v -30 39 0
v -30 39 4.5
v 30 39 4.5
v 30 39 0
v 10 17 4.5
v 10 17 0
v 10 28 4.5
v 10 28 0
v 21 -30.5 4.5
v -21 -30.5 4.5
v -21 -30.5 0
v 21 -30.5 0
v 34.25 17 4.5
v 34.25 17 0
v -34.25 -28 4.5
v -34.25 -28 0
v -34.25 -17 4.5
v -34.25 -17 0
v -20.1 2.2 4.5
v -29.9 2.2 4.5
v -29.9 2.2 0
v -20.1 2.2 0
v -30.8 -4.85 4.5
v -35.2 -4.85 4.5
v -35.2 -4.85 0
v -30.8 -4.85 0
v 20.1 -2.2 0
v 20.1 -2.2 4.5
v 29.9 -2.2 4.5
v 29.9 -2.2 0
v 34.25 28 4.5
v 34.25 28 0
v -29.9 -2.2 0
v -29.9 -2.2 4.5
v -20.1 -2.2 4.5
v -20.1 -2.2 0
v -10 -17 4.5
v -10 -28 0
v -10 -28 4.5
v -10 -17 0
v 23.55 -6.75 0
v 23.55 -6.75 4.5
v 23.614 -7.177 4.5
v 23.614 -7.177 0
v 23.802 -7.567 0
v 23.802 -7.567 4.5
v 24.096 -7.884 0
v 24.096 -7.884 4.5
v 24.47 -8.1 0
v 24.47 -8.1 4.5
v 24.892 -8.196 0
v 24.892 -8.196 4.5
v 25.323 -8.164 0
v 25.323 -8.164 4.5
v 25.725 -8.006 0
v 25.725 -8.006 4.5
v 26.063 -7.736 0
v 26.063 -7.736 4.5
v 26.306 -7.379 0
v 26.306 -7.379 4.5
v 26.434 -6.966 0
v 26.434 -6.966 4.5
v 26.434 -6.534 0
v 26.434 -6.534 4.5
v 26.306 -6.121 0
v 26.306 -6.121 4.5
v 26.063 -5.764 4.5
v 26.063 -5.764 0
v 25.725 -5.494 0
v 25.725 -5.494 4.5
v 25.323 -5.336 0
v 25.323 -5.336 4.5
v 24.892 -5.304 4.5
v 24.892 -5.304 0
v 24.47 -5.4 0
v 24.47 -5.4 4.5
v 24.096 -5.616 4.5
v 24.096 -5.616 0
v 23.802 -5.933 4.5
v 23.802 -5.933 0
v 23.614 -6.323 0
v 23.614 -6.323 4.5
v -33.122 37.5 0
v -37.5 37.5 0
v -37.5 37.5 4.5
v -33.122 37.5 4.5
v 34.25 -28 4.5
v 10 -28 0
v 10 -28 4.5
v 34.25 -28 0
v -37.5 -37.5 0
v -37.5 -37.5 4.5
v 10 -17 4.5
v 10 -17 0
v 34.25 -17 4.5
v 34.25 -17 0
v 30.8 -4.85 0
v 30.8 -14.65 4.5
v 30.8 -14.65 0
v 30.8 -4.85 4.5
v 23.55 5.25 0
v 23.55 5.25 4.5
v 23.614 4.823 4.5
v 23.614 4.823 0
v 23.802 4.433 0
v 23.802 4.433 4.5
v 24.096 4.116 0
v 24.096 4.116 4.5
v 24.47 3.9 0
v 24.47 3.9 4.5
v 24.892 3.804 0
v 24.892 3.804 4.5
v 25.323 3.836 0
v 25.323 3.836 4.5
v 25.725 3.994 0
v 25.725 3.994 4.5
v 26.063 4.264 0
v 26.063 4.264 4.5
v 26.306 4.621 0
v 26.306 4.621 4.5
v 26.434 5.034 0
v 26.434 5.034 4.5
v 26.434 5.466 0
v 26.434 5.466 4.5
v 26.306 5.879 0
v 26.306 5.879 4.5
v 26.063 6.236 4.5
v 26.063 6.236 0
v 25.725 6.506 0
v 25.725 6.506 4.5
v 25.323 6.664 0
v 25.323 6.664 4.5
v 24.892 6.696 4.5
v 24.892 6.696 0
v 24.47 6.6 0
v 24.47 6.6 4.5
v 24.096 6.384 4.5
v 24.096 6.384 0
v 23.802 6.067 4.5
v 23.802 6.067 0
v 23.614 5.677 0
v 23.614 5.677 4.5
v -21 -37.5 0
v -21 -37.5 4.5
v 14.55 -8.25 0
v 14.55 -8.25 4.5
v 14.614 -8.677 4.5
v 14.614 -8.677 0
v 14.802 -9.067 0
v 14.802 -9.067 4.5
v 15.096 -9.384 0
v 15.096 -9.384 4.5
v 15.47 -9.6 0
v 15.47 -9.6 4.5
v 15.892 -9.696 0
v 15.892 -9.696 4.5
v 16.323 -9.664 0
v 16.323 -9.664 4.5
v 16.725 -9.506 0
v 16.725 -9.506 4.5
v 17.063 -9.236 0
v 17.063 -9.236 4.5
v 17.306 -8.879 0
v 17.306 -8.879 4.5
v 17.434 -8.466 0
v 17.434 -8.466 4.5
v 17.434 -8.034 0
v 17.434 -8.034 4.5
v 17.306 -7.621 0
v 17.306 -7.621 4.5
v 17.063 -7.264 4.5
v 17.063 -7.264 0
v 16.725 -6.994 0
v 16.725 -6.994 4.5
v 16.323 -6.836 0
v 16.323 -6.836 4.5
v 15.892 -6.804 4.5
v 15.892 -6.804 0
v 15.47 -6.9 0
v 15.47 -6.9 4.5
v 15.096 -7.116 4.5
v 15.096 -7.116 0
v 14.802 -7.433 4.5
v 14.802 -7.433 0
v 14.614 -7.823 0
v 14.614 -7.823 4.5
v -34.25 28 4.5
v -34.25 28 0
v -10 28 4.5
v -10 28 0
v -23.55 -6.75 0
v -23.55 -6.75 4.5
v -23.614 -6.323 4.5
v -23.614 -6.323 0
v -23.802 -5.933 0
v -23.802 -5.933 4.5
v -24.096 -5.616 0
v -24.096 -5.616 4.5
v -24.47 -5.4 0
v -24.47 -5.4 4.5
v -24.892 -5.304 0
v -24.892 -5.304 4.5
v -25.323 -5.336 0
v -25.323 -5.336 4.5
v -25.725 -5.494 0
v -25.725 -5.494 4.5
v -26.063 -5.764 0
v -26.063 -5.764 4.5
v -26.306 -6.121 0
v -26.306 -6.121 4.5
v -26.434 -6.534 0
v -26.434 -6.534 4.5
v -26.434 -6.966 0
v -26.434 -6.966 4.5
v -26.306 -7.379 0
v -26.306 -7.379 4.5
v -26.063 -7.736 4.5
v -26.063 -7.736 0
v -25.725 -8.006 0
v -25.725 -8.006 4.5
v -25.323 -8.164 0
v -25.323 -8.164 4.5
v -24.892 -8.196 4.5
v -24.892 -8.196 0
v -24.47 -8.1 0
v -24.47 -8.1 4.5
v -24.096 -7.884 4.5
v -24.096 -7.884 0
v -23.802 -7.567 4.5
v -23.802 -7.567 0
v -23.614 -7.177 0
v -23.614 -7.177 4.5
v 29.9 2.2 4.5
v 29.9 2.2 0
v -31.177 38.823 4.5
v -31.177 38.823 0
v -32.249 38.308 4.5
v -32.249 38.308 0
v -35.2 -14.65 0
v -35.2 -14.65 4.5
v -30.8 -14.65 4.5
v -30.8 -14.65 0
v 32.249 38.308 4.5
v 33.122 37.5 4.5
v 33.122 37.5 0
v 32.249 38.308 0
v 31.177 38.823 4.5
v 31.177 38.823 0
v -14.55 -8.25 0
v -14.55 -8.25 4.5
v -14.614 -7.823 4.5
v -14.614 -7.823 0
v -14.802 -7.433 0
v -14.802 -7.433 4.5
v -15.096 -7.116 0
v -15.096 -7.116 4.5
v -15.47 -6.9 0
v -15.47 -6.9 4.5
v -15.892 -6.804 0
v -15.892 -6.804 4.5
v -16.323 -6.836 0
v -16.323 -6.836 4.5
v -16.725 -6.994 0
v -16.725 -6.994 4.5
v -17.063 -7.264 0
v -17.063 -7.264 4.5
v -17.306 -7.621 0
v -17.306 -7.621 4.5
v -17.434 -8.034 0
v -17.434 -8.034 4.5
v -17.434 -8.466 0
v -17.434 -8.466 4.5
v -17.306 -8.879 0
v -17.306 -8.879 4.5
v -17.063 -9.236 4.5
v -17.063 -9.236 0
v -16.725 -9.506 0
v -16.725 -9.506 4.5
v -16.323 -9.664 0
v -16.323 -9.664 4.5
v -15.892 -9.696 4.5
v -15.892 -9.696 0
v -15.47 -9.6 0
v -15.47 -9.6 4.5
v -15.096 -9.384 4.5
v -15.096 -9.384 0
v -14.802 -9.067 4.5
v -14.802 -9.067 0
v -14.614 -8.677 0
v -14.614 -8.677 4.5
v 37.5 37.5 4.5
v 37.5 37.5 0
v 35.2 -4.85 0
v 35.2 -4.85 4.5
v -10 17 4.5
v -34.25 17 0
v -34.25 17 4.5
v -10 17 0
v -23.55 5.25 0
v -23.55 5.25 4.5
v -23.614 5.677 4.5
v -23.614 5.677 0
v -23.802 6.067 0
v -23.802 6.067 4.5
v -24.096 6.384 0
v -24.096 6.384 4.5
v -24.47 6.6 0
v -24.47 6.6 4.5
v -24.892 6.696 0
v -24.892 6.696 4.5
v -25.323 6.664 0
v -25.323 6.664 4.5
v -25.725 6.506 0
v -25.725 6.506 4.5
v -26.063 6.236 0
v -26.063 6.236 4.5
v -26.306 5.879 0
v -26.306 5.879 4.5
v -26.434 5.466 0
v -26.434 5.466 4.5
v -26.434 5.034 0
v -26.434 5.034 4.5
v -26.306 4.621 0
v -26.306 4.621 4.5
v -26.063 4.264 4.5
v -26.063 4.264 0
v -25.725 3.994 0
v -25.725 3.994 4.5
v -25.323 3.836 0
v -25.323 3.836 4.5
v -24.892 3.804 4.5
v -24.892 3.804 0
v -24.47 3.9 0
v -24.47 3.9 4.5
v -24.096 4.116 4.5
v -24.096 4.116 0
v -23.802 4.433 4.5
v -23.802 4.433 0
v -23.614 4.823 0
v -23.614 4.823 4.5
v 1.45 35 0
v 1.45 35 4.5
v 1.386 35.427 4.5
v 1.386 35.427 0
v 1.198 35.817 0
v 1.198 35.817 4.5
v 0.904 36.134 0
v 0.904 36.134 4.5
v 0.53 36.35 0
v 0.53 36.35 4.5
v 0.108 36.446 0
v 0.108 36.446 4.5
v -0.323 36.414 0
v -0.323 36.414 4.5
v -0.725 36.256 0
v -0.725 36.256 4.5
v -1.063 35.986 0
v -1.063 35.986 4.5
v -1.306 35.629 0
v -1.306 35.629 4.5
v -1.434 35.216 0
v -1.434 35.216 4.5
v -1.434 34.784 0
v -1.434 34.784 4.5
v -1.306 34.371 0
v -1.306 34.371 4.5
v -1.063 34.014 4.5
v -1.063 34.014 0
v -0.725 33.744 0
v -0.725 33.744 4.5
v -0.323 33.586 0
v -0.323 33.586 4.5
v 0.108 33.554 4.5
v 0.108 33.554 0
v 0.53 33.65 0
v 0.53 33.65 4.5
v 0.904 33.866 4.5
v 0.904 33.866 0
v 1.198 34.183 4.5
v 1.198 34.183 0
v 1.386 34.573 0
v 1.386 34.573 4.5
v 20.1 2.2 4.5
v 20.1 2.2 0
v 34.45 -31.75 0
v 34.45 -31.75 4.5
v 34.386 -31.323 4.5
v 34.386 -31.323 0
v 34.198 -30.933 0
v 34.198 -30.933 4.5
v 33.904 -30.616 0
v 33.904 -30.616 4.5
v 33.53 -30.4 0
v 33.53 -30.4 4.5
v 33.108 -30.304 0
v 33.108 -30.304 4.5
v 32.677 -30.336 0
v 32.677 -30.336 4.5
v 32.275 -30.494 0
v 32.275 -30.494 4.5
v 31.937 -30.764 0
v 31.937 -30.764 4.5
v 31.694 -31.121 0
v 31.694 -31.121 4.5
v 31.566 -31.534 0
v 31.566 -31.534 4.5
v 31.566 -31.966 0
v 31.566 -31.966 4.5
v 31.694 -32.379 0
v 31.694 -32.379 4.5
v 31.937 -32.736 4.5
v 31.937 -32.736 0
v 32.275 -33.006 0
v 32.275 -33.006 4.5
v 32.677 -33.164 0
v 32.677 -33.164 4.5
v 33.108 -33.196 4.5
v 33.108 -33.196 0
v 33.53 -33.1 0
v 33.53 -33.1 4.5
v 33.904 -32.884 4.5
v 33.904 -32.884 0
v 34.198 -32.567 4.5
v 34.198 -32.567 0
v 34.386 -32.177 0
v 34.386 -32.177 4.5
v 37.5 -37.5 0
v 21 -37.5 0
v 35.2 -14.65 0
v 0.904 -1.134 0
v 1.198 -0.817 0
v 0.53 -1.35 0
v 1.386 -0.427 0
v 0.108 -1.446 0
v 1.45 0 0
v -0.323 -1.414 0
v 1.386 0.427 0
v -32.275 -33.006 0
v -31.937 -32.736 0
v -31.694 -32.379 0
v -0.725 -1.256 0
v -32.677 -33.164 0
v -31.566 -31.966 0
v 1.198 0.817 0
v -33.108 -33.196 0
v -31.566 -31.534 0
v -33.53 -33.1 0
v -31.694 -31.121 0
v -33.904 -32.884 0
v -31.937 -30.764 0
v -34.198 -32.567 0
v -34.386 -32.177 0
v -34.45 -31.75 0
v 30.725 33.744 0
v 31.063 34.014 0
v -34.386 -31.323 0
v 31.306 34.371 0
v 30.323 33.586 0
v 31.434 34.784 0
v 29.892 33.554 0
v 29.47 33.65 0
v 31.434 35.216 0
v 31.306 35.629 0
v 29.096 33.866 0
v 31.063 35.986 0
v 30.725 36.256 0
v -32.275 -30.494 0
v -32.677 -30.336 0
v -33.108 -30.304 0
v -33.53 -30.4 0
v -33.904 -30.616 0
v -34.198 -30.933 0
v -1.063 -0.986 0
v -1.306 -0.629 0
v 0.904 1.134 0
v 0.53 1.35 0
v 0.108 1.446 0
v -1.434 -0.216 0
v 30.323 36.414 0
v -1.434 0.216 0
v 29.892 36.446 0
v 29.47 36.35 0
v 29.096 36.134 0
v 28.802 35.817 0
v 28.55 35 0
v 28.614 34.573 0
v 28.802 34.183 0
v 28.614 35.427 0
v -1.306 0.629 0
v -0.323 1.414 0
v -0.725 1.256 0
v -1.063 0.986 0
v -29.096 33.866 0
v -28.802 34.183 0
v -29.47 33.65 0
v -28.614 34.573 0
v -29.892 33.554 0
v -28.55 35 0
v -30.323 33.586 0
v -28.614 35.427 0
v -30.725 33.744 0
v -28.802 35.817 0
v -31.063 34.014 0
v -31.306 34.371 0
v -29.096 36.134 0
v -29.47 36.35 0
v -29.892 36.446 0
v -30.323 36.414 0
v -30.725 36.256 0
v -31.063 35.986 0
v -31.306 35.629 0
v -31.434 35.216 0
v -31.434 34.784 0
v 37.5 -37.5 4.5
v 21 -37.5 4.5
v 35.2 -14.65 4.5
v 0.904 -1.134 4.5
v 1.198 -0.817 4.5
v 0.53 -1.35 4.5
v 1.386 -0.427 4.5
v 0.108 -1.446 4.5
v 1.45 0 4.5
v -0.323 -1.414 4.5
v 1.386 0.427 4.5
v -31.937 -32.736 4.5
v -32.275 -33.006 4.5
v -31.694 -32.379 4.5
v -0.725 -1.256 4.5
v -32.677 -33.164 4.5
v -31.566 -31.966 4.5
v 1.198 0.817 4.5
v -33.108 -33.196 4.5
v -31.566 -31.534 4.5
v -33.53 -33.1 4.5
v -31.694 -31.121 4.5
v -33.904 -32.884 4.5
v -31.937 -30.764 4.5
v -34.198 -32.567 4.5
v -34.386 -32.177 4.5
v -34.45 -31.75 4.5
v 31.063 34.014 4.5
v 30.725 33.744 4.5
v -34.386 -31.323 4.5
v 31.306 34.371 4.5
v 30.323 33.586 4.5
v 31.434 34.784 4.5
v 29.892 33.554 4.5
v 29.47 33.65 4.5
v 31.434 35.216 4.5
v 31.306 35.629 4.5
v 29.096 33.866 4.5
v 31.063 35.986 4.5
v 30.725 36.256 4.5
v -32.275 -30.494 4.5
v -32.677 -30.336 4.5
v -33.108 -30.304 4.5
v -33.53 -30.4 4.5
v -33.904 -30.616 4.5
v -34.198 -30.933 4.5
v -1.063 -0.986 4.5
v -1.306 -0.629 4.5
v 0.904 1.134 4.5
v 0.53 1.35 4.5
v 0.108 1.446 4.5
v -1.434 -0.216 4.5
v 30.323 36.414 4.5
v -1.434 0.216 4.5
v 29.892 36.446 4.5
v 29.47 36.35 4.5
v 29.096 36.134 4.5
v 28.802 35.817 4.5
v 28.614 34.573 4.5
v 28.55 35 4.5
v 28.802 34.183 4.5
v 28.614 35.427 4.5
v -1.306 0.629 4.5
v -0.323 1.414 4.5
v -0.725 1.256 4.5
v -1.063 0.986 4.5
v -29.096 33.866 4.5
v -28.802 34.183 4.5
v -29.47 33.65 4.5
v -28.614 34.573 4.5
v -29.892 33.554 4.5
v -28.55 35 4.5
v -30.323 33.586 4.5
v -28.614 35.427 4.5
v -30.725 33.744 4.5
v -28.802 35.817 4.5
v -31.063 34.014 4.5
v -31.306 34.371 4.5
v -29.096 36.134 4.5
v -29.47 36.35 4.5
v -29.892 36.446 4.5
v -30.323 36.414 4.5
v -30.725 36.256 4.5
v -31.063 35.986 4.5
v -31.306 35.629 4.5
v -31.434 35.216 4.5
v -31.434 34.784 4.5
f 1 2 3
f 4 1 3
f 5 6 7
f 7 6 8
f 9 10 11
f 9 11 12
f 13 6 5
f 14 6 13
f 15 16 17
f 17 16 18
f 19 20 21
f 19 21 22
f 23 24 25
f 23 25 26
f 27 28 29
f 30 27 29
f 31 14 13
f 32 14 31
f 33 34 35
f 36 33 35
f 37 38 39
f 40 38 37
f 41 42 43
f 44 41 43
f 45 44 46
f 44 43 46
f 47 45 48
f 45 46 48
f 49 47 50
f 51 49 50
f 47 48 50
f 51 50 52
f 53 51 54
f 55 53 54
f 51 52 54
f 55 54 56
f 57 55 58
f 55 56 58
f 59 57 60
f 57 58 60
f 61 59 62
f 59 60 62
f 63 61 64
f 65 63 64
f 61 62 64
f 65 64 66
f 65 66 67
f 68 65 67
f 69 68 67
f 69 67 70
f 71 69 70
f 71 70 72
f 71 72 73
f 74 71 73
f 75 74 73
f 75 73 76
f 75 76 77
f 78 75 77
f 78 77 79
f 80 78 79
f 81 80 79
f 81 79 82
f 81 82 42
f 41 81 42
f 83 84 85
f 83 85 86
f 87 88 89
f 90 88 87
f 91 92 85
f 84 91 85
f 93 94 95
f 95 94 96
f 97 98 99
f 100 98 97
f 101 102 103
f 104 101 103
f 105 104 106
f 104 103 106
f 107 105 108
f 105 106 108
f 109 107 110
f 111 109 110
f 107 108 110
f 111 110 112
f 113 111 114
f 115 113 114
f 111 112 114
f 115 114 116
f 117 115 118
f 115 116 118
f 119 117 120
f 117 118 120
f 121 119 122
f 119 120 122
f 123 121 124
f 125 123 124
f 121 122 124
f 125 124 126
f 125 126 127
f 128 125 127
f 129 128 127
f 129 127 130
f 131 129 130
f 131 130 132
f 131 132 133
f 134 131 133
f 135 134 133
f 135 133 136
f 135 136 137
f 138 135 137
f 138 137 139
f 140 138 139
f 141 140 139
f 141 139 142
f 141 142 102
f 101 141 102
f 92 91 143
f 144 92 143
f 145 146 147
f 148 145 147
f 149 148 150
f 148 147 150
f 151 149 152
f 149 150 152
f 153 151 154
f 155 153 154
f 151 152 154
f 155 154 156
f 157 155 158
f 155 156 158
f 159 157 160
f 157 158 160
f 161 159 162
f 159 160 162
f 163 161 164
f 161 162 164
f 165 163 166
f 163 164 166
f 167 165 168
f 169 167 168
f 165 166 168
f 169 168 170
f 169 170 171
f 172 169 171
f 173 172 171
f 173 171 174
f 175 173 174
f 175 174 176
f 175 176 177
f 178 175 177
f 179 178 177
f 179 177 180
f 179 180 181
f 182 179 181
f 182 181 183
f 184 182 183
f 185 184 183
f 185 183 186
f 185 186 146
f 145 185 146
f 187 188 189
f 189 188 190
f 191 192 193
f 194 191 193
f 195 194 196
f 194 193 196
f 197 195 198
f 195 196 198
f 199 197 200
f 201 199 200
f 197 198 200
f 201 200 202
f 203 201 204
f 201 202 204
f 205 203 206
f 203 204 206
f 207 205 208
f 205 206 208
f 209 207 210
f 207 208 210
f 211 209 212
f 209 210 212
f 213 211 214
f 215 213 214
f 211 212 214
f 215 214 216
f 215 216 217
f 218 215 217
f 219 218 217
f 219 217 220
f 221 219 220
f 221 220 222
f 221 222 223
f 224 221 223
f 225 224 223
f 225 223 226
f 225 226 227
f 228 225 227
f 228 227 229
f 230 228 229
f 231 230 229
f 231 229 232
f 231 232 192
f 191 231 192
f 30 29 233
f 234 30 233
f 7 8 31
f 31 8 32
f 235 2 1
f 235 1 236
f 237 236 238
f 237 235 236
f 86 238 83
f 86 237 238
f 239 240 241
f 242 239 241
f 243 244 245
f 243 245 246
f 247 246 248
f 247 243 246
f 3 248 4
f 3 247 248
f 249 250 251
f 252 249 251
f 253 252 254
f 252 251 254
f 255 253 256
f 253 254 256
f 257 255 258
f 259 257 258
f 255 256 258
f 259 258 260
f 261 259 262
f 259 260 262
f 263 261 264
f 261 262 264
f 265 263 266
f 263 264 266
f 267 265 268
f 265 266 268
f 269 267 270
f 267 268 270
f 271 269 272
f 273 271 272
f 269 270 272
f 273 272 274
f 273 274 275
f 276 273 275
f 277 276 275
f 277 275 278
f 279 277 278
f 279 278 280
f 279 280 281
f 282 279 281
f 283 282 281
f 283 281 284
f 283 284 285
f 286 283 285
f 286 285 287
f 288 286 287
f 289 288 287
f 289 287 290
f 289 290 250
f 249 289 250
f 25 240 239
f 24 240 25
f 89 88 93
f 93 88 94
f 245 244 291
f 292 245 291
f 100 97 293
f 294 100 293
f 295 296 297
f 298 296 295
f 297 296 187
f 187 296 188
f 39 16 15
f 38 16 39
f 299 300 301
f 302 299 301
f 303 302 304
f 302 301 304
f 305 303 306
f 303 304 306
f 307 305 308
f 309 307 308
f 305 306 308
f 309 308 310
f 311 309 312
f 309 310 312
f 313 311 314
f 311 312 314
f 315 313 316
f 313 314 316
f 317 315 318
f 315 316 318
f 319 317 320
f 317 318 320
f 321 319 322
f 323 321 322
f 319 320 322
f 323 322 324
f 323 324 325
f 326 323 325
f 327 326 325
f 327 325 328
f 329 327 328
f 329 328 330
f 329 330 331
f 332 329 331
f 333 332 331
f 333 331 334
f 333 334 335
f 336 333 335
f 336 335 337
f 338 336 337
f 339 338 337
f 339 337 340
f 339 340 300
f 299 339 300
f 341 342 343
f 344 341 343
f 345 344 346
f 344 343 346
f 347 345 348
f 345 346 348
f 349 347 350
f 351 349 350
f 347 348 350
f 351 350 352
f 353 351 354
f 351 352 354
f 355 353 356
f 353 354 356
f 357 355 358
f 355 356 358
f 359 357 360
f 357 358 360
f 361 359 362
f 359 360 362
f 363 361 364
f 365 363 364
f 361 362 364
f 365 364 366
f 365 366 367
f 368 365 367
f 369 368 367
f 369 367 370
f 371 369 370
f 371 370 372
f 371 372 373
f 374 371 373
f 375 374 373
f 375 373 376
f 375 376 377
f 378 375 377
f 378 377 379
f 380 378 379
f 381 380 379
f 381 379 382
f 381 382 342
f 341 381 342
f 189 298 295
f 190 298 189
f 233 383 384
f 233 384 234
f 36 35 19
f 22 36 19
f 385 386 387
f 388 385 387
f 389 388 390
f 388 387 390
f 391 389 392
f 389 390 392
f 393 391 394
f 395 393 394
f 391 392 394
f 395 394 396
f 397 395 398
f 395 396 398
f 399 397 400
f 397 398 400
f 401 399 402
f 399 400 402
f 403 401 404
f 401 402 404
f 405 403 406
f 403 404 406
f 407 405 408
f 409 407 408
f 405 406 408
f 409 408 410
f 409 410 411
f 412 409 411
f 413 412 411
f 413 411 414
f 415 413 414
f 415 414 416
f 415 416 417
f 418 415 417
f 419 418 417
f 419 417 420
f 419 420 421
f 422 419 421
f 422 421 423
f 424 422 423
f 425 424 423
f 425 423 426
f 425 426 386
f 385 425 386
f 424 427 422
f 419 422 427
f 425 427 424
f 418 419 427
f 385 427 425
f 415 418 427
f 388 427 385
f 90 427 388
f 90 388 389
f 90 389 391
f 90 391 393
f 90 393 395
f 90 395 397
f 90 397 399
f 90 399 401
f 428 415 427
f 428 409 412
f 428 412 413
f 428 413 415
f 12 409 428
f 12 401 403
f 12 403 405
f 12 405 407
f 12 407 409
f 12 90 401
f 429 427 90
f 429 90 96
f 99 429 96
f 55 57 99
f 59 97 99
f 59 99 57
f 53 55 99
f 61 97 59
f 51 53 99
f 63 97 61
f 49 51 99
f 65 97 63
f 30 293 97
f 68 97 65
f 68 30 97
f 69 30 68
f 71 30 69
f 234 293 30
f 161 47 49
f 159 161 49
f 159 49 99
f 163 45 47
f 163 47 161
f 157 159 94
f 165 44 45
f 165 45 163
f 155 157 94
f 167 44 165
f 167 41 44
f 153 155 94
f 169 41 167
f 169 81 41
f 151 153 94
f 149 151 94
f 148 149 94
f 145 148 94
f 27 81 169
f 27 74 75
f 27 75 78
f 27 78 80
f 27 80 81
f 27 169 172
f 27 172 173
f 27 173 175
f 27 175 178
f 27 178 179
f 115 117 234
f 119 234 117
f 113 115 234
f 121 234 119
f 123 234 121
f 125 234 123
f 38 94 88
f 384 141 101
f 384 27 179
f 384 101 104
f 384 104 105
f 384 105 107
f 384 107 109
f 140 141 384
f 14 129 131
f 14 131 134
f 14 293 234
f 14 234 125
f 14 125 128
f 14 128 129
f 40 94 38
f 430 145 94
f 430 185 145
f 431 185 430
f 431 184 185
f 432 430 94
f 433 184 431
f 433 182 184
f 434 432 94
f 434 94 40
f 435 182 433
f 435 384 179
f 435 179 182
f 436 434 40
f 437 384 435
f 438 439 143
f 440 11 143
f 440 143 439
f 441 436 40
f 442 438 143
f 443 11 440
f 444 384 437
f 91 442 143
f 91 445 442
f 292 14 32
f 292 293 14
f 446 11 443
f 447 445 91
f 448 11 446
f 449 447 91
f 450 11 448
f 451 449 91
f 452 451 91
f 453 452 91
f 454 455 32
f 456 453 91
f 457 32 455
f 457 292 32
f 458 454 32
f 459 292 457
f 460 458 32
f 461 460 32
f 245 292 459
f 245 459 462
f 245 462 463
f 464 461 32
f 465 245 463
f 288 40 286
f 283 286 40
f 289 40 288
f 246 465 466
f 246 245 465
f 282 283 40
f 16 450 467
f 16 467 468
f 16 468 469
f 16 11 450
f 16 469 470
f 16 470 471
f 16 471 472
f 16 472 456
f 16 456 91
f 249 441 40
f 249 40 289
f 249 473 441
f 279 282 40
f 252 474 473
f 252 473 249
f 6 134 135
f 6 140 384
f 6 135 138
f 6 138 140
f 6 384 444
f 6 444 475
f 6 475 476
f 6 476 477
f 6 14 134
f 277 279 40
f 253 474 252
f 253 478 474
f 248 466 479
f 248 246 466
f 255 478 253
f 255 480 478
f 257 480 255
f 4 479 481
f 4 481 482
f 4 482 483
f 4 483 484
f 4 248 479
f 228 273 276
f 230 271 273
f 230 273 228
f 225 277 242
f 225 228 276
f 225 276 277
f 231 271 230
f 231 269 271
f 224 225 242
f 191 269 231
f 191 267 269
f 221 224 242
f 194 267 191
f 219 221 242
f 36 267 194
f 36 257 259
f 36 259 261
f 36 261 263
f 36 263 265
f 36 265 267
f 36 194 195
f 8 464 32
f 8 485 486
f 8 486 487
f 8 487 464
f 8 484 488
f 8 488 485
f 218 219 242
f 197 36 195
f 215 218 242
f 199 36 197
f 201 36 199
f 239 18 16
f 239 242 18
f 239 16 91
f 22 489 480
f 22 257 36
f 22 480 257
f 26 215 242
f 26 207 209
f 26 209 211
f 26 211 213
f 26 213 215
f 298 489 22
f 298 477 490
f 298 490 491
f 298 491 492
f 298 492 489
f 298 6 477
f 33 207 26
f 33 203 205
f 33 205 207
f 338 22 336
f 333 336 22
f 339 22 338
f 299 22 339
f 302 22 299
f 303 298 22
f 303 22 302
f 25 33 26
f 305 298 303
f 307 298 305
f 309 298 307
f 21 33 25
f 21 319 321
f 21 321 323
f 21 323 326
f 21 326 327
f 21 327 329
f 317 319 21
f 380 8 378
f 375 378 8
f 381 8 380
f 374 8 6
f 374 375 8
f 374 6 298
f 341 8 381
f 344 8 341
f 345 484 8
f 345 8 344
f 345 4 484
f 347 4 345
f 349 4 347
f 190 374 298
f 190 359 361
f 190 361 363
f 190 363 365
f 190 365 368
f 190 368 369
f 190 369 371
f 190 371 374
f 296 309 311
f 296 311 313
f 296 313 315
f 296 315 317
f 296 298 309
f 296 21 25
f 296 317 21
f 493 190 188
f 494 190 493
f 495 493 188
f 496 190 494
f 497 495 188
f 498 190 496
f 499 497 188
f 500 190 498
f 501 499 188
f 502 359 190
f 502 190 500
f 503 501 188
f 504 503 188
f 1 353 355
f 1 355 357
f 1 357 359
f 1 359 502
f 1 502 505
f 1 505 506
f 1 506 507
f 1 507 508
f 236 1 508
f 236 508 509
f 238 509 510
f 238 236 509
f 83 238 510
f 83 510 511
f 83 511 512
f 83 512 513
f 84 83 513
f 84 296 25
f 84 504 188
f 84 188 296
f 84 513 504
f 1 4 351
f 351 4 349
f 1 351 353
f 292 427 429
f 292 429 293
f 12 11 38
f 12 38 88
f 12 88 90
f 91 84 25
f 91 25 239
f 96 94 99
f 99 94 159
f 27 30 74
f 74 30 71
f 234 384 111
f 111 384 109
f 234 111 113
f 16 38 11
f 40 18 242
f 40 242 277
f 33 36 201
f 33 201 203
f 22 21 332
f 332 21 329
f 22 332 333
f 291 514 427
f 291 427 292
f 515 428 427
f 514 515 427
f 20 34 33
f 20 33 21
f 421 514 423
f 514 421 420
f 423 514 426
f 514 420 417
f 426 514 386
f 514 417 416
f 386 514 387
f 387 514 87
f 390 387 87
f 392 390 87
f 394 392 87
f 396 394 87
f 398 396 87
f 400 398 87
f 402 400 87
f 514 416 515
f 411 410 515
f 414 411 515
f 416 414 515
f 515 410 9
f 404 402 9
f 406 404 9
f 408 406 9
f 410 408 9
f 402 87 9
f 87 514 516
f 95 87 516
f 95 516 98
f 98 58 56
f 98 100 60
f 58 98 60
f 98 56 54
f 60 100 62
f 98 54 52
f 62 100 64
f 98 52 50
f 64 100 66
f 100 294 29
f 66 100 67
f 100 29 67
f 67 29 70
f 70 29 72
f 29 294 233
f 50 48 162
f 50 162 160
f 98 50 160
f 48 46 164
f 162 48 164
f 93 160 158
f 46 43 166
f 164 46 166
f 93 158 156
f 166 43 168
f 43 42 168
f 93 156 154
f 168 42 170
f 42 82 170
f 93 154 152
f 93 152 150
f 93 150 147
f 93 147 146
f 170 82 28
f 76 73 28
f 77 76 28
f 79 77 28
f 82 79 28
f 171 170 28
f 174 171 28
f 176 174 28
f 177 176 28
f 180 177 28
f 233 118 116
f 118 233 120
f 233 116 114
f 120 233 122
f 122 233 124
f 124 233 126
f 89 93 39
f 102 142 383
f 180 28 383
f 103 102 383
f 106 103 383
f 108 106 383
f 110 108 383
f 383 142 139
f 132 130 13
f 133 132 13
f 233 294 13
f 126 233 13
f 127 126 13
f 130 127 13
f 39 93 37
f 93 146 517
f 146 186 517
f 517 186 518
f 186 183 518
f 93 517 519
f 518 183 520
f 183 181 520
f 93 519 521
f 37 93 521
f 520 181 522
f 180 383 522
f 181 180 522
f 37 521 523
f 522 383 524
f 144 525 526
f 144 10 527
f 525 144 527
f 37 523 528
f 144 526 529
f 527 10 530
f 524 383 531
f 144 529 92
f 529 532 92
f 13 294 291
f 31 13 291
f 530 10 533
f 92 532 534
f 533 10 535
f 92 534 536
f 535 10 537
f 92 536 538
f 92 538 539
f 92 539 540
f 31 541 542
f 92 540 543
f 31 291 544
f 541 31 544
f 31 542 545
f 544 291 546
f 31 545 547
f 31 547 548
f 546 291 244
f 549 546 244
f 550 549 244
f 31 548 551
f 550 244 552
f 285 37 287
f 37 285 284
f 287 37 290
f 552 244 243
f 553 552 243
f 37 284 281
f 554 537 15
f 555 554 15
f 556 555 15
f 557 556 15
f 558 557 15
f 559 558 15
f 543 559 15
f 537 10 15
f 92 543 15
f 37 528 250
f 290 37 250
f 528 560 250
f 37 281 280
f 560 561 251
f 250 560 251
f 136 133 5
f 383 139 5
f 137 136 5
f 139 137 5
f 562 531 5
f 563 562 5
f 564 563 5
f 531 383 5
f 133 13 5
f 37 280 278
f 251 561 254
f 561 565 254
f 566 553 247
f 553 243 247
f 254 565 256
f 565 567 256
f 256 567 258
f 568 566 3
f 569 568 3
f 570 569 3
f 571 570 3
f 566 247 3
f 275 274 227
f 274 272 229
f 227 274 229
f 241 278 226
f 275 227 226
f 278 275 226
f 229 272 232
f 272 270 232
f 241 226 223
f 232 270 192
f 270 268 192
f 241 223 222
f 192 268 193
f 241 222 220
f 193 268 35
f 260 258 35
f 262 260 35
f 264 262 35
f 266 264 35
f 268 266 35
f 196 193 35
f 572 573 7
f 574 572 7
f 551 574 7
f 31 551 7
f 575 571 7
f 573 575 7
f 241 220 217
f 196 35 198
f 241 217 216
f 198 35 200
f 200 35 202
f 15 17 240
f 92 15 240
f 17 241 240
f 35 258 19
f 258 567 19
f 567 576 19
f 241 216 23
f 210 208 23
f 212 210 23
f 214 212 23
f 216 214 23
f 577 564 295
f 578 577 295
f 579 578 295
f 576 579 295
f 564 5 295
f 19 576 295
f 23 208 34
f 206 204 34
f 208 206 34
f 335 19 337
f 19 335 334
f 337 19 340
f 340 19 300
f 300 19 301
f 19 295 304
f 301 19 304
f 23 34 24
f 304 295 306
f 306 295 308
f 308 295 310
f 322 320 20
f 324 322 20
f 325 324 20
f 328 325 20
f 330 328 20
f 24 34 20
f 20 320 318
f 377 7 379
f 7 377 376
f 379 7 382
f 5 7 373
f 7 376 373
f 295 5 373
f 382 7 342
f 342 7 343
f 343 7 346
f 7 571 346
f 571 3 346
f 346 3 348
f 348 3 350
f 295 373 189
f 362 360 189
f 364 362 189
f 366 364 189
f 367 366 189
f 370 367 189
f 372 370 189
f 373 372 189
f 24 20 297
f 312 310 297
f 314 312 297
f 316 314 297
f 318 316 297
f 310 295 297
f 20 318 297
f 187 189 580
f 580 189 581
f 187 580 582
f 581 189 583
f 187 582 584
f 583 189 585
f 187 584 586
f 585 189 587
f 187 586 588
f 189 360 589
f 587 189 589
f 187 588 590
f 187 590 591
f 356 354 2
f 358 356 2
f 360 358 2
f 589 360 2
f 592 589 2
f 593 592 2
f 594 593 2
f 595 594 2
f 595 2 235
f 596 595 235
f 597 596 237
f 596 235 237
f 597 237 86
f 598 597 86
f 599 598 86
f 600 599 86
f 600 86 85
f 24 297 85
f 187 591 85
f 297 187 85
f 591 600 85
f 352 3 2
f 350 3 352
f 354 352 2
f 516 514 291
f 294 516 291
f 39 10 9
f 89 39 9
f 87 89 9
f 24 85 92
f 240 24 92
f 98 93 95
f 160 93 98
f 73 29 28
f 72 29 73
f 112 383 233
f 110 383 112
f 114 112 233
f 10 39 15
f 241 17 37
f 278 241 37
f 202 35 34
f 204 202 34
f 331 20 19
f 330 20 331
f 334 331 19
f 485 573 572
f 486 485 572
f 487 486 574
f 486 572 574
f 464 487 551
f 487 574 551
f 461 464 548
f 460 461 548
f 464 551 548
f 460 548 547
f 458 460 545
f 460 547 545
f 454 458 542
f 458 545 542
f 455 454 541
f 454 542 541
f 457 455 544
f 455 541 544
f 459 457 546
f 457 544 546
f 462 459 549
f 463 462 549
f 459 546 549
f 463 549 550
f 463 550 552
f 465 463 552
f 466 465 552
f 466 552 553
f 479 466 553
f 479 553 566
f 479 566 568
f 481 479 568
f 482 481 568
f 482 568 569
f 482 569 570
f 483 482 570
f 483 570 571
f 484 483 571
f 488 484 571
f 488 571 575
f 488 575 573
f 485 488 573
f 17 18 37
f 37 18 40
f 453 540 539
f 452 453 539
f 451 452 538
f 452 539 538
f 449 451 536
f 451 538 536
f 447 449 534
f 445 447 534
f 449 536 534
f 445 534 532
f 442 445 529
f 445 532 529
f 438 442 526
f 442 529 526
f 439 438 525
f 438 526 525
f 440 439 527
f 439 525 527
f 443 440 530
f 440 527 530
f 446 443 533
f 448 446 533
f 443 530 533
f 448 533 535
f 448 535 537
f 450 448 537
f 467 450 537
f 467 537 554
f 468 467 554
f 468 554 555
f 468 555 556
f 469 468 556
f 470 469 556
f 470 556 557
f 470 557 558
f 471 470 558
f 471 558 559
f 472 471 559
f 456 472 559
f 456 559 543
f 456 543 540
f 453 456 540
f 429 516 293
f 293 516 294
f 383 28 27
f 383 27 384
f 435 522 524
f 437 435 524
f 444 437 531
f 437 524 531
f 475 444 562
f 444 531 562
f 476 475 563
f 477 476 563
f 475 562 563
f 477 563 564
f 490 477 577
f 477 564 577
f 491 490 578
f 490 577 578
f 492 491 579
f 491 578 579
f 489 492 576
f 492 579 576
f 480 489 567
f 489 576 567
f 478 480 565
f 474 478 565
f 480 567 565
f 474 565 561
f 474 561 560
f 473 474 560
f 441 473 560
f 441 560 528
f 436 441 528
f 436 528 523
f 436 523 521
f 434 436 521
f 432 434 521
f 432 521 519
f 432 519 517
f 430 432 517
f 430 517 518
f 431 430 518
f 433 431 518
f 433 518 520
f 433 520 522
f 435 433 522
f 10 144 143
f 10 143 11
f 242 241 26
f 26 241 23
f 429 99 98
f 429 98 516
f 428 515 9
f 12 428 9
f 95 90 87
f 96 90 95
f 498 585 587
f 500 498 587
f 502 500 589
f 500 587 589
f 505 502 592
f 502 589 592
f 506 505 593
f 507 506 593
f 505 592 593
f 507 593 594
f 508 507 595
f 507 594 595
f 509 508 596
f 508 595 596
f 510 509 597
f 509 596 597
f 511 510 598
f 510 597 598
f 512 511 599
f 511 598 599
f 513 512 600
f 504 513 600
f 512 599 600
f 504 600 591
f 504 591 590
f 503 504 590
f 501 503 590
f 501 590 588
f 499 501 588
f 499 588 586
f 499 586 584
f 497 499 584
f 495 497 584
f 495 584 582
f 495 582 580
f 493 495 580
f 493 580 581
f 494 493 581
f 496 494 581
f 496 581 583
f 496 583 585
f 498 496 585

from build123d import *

# Parameters (mm, degrees)
SKETCH1_W            = 95
SKETCH1_H            = 75
SKETCH1_W_2          = 24.25
SKETCH1_H_2          = 11
BOSS_EXTRUDE1_DEPTH  = 4.5
SKETCH2_R            = 1.45
SCREWHOLES_DEPTH     = 61.685665523
SKETCH4_R            = 1.45
SKETCH4_W            = 9.8
SKETCH4_H            = 4.4
CUT_EXTRUDE3_DEPTH   = 61.685665523
SKETCH5_R            = 1.45
SKETCH5_W            = 4.4
SKETCH5_H            = 9.8
CUT_EXTRUDE4_DEPTH   = 61.685665523
SKETCH9_R            = 4
SKETCH9_R_2          = 1.45
BOSS_EXTRUDE3_DEPTH  = 4.5
SKETCH10_W           = 10
SKETCH10_H           = 75
CUT_EXTRUDE5_DEPTH   = 62.623859016
BOSS_EXTRUDE4_DEPTH  = 4.5
SKETCH12_R           = 1.45
FANBRACESCREWS_DEPTH = 55.290883213
SKETCH13_W           = 42
SKETCH13_H           = 14
CUT_EXTRUDE7_DEPTH   = 55.290883213
SKETCH15_R           = 1.45
BELTCLIPSCREWS_DEPTH = 55.290883213


with BuildPart() as part:
    # Sketch1 → Boss-Extrude1 (new body)
    with BuildSketch(Plane.XY):
        Rectangle(SKETCH1_W, SKETCH1_H)
        with Locations((-22.125, 22.5)):
            Rectangle(SKETCH1_W_2, SKETCH1_H_2, mode=Mode.SUBTRACT)
        with Locations((22.125, 22.5)):
            Rectangle(SKETCH1_W_2, SKETCH1_H_2, mode=Mode.SUBTRACT)
        with Locations((22.125, -22.5)):
            Rectangle(SKETCH1_W_2, SKETCH1_H_2, mode=Mode.SUBTRACT)
        with Locations((-22.125, -22.5)):
            Rectangle(SKETCH1_W_2, SKETCH1_H_2, mode=Mode.SUBTRACT)
    extrude(amount=BOSS_EXTRUDE1_DEPTH)

    # Sketch2 → screwHoles (cut, through all)
    with BuildSketch(Plane.XY.offset(4.5)):
        with Locations((-30, 35)):
            Circle(SKETCH2_R)
        with Locations(Location((30, 35, 0), (0, 0, 180))):
            Circle(SKETCH2_R)
        with Locations((40, 0)):
            Circle(SKETCH2_R)
        with Locations(Location((-40, 0, 0), (0, 0, 180))):
            Circle(SKETCH2_R)
        with Locations((0, 35)):
            Circle(SKETCH2_R)
    extrude(amount=-SCREWHOLES_DEPTH, mode=Mode.SUBTRACT)

    # Sketch4 → Cut-Extrude3 (cut, through all)
    with BuildSketch(Plane.XY.offset(4.5)):
        Circle(SKETCH4_R)
        with Locations((-25, 0)):
            Rectangle(SKETCH4_W, SKETCH4_H)
        with Locations((25, 0)):
            Rectangle(SKETCH4_W, SKETCH4_H)
    extrude(amount=-CUT_EXTRUDE3_DEPTH, mode=Mode.SUBTRACT)

    # Sketch5 → Cut-Extrude4 (cut, through all)
    with BuildSketch(Plane.XY.offset(4.5)):
        with Locations((33, -31.75)):
            Circle(SKETCH5_R)
        with Locations(Location((-33, -31.75, 0), (0, 0, 180))):
            Circle(SKETCH5_R)
        with Locations((33, -9.75)):
            Rectangle(SKETCH5_W, SKETCH5_H)
        with Locations((-33, -9.75)):
            Rectangle(SKETCH5_W, SKETCH5_H)
    extrude(amount=-CUT_EXTRUDE4_DEPTH, mode=Mode.SUBTRACT)

    # Sketch9 → Boss-Extrude3 (add, through all)
    # profile 1 of 2: a face of its own
    with BuildSketch(Plane.XY.offset(4.5)):
        with Locations((-30, 35)):
            Circle(SKETCH9_R)
        with Locations((-30, 35)):
            Circle(SKETCH9_R_2, mode=Mode.SUBTRACT)
    # profile 2 of 2: a face of its own
    with BuildSketch(Plane.XY.offset(4.5)):
        with Locations((30, 35)):
            Circle(SKETCH9_R)
        with Locations(Location((30, 35, 0), (0, 0, 180))):
            Circle(SKETCH9_R_2, mode=Mode.SUBTRACT)
    extrude(amount=-BOSS_EXTRUDE3_DEPTH)

    # Sketch10 → Cut-Extrude5 (cut, through all)
    with BuildSketch(Plane.XY.offset(4.5)):
        with Locations((-42.5, 0)):
            Rectangle(SKETCH10_W, SKETCH10_H)
        with Locations((42.5, 0)):
            Rectangle(SKETCH10_W, SKETCH10_H)
    extrude(amount=-CUT_EXTRUDE5_DEPTH, mode=Mode.SUBTRACT)

    # Sketch11 → Boss-Extrude4 (add, through all)
    with BuildSketch(Plane.XY.offset(4.5)):
        Polygon((-30, 39), (30, 39), (26.877501001, 37.5), (-26.877501001, 37.5), align=None)
    extrude(amount=-BOSS_EXTRUDE4_DEPTH)

    # Sketch12 → FanBraceScrews (cut, through all)
    with BuildSketch(Plane.XY.offset(4.5)):
        with Locations((-16, -8.25)):
            Circle(SKETCH12_R)
        with Locations(Location((16, -8.25, 0), (0, 0, 180))):
            Circle(SKETCH12_R)
    extrude(amount=-FANBRACESCREWS_DEPTH, mode=Mode.SUBTRACT)

    # Sketch13 → Cut-Extrude7 (cut, through all)
    with BuildSketch(Plane.XY.offset(4.5)):
        with Locations((0, -37.5)):
            Rectangle(SKETCH13_W, SKETCH13_H)
    extrude(amount=-CUT_EXTRUDE7_DEPTH, mode=Mode.SUBTRACT)

    # Sketch15 → BeltClipScrews (cut, through all)
    with BuildSketch(Plane.XY.offset(4.5)):
        with Locations((-25, 5.25)):
            Circle(SKETCH15_R)
        with Locations((-25, -6.75)):
            Circle(SKETCH15_R)
        with Locations(Location((25, -6.75, 0), (0, 0, 180))):
            Circle(SKETCH15_R)
        with Locations(Location((25, 5.25, 0), (0, 0, 180))):
            Circle(SKETCH15_R)
    extrude(amount=-BELTCLIPSCREWS_DEPTH, mode=Mode.SUBTRACT)


solid = part.part
